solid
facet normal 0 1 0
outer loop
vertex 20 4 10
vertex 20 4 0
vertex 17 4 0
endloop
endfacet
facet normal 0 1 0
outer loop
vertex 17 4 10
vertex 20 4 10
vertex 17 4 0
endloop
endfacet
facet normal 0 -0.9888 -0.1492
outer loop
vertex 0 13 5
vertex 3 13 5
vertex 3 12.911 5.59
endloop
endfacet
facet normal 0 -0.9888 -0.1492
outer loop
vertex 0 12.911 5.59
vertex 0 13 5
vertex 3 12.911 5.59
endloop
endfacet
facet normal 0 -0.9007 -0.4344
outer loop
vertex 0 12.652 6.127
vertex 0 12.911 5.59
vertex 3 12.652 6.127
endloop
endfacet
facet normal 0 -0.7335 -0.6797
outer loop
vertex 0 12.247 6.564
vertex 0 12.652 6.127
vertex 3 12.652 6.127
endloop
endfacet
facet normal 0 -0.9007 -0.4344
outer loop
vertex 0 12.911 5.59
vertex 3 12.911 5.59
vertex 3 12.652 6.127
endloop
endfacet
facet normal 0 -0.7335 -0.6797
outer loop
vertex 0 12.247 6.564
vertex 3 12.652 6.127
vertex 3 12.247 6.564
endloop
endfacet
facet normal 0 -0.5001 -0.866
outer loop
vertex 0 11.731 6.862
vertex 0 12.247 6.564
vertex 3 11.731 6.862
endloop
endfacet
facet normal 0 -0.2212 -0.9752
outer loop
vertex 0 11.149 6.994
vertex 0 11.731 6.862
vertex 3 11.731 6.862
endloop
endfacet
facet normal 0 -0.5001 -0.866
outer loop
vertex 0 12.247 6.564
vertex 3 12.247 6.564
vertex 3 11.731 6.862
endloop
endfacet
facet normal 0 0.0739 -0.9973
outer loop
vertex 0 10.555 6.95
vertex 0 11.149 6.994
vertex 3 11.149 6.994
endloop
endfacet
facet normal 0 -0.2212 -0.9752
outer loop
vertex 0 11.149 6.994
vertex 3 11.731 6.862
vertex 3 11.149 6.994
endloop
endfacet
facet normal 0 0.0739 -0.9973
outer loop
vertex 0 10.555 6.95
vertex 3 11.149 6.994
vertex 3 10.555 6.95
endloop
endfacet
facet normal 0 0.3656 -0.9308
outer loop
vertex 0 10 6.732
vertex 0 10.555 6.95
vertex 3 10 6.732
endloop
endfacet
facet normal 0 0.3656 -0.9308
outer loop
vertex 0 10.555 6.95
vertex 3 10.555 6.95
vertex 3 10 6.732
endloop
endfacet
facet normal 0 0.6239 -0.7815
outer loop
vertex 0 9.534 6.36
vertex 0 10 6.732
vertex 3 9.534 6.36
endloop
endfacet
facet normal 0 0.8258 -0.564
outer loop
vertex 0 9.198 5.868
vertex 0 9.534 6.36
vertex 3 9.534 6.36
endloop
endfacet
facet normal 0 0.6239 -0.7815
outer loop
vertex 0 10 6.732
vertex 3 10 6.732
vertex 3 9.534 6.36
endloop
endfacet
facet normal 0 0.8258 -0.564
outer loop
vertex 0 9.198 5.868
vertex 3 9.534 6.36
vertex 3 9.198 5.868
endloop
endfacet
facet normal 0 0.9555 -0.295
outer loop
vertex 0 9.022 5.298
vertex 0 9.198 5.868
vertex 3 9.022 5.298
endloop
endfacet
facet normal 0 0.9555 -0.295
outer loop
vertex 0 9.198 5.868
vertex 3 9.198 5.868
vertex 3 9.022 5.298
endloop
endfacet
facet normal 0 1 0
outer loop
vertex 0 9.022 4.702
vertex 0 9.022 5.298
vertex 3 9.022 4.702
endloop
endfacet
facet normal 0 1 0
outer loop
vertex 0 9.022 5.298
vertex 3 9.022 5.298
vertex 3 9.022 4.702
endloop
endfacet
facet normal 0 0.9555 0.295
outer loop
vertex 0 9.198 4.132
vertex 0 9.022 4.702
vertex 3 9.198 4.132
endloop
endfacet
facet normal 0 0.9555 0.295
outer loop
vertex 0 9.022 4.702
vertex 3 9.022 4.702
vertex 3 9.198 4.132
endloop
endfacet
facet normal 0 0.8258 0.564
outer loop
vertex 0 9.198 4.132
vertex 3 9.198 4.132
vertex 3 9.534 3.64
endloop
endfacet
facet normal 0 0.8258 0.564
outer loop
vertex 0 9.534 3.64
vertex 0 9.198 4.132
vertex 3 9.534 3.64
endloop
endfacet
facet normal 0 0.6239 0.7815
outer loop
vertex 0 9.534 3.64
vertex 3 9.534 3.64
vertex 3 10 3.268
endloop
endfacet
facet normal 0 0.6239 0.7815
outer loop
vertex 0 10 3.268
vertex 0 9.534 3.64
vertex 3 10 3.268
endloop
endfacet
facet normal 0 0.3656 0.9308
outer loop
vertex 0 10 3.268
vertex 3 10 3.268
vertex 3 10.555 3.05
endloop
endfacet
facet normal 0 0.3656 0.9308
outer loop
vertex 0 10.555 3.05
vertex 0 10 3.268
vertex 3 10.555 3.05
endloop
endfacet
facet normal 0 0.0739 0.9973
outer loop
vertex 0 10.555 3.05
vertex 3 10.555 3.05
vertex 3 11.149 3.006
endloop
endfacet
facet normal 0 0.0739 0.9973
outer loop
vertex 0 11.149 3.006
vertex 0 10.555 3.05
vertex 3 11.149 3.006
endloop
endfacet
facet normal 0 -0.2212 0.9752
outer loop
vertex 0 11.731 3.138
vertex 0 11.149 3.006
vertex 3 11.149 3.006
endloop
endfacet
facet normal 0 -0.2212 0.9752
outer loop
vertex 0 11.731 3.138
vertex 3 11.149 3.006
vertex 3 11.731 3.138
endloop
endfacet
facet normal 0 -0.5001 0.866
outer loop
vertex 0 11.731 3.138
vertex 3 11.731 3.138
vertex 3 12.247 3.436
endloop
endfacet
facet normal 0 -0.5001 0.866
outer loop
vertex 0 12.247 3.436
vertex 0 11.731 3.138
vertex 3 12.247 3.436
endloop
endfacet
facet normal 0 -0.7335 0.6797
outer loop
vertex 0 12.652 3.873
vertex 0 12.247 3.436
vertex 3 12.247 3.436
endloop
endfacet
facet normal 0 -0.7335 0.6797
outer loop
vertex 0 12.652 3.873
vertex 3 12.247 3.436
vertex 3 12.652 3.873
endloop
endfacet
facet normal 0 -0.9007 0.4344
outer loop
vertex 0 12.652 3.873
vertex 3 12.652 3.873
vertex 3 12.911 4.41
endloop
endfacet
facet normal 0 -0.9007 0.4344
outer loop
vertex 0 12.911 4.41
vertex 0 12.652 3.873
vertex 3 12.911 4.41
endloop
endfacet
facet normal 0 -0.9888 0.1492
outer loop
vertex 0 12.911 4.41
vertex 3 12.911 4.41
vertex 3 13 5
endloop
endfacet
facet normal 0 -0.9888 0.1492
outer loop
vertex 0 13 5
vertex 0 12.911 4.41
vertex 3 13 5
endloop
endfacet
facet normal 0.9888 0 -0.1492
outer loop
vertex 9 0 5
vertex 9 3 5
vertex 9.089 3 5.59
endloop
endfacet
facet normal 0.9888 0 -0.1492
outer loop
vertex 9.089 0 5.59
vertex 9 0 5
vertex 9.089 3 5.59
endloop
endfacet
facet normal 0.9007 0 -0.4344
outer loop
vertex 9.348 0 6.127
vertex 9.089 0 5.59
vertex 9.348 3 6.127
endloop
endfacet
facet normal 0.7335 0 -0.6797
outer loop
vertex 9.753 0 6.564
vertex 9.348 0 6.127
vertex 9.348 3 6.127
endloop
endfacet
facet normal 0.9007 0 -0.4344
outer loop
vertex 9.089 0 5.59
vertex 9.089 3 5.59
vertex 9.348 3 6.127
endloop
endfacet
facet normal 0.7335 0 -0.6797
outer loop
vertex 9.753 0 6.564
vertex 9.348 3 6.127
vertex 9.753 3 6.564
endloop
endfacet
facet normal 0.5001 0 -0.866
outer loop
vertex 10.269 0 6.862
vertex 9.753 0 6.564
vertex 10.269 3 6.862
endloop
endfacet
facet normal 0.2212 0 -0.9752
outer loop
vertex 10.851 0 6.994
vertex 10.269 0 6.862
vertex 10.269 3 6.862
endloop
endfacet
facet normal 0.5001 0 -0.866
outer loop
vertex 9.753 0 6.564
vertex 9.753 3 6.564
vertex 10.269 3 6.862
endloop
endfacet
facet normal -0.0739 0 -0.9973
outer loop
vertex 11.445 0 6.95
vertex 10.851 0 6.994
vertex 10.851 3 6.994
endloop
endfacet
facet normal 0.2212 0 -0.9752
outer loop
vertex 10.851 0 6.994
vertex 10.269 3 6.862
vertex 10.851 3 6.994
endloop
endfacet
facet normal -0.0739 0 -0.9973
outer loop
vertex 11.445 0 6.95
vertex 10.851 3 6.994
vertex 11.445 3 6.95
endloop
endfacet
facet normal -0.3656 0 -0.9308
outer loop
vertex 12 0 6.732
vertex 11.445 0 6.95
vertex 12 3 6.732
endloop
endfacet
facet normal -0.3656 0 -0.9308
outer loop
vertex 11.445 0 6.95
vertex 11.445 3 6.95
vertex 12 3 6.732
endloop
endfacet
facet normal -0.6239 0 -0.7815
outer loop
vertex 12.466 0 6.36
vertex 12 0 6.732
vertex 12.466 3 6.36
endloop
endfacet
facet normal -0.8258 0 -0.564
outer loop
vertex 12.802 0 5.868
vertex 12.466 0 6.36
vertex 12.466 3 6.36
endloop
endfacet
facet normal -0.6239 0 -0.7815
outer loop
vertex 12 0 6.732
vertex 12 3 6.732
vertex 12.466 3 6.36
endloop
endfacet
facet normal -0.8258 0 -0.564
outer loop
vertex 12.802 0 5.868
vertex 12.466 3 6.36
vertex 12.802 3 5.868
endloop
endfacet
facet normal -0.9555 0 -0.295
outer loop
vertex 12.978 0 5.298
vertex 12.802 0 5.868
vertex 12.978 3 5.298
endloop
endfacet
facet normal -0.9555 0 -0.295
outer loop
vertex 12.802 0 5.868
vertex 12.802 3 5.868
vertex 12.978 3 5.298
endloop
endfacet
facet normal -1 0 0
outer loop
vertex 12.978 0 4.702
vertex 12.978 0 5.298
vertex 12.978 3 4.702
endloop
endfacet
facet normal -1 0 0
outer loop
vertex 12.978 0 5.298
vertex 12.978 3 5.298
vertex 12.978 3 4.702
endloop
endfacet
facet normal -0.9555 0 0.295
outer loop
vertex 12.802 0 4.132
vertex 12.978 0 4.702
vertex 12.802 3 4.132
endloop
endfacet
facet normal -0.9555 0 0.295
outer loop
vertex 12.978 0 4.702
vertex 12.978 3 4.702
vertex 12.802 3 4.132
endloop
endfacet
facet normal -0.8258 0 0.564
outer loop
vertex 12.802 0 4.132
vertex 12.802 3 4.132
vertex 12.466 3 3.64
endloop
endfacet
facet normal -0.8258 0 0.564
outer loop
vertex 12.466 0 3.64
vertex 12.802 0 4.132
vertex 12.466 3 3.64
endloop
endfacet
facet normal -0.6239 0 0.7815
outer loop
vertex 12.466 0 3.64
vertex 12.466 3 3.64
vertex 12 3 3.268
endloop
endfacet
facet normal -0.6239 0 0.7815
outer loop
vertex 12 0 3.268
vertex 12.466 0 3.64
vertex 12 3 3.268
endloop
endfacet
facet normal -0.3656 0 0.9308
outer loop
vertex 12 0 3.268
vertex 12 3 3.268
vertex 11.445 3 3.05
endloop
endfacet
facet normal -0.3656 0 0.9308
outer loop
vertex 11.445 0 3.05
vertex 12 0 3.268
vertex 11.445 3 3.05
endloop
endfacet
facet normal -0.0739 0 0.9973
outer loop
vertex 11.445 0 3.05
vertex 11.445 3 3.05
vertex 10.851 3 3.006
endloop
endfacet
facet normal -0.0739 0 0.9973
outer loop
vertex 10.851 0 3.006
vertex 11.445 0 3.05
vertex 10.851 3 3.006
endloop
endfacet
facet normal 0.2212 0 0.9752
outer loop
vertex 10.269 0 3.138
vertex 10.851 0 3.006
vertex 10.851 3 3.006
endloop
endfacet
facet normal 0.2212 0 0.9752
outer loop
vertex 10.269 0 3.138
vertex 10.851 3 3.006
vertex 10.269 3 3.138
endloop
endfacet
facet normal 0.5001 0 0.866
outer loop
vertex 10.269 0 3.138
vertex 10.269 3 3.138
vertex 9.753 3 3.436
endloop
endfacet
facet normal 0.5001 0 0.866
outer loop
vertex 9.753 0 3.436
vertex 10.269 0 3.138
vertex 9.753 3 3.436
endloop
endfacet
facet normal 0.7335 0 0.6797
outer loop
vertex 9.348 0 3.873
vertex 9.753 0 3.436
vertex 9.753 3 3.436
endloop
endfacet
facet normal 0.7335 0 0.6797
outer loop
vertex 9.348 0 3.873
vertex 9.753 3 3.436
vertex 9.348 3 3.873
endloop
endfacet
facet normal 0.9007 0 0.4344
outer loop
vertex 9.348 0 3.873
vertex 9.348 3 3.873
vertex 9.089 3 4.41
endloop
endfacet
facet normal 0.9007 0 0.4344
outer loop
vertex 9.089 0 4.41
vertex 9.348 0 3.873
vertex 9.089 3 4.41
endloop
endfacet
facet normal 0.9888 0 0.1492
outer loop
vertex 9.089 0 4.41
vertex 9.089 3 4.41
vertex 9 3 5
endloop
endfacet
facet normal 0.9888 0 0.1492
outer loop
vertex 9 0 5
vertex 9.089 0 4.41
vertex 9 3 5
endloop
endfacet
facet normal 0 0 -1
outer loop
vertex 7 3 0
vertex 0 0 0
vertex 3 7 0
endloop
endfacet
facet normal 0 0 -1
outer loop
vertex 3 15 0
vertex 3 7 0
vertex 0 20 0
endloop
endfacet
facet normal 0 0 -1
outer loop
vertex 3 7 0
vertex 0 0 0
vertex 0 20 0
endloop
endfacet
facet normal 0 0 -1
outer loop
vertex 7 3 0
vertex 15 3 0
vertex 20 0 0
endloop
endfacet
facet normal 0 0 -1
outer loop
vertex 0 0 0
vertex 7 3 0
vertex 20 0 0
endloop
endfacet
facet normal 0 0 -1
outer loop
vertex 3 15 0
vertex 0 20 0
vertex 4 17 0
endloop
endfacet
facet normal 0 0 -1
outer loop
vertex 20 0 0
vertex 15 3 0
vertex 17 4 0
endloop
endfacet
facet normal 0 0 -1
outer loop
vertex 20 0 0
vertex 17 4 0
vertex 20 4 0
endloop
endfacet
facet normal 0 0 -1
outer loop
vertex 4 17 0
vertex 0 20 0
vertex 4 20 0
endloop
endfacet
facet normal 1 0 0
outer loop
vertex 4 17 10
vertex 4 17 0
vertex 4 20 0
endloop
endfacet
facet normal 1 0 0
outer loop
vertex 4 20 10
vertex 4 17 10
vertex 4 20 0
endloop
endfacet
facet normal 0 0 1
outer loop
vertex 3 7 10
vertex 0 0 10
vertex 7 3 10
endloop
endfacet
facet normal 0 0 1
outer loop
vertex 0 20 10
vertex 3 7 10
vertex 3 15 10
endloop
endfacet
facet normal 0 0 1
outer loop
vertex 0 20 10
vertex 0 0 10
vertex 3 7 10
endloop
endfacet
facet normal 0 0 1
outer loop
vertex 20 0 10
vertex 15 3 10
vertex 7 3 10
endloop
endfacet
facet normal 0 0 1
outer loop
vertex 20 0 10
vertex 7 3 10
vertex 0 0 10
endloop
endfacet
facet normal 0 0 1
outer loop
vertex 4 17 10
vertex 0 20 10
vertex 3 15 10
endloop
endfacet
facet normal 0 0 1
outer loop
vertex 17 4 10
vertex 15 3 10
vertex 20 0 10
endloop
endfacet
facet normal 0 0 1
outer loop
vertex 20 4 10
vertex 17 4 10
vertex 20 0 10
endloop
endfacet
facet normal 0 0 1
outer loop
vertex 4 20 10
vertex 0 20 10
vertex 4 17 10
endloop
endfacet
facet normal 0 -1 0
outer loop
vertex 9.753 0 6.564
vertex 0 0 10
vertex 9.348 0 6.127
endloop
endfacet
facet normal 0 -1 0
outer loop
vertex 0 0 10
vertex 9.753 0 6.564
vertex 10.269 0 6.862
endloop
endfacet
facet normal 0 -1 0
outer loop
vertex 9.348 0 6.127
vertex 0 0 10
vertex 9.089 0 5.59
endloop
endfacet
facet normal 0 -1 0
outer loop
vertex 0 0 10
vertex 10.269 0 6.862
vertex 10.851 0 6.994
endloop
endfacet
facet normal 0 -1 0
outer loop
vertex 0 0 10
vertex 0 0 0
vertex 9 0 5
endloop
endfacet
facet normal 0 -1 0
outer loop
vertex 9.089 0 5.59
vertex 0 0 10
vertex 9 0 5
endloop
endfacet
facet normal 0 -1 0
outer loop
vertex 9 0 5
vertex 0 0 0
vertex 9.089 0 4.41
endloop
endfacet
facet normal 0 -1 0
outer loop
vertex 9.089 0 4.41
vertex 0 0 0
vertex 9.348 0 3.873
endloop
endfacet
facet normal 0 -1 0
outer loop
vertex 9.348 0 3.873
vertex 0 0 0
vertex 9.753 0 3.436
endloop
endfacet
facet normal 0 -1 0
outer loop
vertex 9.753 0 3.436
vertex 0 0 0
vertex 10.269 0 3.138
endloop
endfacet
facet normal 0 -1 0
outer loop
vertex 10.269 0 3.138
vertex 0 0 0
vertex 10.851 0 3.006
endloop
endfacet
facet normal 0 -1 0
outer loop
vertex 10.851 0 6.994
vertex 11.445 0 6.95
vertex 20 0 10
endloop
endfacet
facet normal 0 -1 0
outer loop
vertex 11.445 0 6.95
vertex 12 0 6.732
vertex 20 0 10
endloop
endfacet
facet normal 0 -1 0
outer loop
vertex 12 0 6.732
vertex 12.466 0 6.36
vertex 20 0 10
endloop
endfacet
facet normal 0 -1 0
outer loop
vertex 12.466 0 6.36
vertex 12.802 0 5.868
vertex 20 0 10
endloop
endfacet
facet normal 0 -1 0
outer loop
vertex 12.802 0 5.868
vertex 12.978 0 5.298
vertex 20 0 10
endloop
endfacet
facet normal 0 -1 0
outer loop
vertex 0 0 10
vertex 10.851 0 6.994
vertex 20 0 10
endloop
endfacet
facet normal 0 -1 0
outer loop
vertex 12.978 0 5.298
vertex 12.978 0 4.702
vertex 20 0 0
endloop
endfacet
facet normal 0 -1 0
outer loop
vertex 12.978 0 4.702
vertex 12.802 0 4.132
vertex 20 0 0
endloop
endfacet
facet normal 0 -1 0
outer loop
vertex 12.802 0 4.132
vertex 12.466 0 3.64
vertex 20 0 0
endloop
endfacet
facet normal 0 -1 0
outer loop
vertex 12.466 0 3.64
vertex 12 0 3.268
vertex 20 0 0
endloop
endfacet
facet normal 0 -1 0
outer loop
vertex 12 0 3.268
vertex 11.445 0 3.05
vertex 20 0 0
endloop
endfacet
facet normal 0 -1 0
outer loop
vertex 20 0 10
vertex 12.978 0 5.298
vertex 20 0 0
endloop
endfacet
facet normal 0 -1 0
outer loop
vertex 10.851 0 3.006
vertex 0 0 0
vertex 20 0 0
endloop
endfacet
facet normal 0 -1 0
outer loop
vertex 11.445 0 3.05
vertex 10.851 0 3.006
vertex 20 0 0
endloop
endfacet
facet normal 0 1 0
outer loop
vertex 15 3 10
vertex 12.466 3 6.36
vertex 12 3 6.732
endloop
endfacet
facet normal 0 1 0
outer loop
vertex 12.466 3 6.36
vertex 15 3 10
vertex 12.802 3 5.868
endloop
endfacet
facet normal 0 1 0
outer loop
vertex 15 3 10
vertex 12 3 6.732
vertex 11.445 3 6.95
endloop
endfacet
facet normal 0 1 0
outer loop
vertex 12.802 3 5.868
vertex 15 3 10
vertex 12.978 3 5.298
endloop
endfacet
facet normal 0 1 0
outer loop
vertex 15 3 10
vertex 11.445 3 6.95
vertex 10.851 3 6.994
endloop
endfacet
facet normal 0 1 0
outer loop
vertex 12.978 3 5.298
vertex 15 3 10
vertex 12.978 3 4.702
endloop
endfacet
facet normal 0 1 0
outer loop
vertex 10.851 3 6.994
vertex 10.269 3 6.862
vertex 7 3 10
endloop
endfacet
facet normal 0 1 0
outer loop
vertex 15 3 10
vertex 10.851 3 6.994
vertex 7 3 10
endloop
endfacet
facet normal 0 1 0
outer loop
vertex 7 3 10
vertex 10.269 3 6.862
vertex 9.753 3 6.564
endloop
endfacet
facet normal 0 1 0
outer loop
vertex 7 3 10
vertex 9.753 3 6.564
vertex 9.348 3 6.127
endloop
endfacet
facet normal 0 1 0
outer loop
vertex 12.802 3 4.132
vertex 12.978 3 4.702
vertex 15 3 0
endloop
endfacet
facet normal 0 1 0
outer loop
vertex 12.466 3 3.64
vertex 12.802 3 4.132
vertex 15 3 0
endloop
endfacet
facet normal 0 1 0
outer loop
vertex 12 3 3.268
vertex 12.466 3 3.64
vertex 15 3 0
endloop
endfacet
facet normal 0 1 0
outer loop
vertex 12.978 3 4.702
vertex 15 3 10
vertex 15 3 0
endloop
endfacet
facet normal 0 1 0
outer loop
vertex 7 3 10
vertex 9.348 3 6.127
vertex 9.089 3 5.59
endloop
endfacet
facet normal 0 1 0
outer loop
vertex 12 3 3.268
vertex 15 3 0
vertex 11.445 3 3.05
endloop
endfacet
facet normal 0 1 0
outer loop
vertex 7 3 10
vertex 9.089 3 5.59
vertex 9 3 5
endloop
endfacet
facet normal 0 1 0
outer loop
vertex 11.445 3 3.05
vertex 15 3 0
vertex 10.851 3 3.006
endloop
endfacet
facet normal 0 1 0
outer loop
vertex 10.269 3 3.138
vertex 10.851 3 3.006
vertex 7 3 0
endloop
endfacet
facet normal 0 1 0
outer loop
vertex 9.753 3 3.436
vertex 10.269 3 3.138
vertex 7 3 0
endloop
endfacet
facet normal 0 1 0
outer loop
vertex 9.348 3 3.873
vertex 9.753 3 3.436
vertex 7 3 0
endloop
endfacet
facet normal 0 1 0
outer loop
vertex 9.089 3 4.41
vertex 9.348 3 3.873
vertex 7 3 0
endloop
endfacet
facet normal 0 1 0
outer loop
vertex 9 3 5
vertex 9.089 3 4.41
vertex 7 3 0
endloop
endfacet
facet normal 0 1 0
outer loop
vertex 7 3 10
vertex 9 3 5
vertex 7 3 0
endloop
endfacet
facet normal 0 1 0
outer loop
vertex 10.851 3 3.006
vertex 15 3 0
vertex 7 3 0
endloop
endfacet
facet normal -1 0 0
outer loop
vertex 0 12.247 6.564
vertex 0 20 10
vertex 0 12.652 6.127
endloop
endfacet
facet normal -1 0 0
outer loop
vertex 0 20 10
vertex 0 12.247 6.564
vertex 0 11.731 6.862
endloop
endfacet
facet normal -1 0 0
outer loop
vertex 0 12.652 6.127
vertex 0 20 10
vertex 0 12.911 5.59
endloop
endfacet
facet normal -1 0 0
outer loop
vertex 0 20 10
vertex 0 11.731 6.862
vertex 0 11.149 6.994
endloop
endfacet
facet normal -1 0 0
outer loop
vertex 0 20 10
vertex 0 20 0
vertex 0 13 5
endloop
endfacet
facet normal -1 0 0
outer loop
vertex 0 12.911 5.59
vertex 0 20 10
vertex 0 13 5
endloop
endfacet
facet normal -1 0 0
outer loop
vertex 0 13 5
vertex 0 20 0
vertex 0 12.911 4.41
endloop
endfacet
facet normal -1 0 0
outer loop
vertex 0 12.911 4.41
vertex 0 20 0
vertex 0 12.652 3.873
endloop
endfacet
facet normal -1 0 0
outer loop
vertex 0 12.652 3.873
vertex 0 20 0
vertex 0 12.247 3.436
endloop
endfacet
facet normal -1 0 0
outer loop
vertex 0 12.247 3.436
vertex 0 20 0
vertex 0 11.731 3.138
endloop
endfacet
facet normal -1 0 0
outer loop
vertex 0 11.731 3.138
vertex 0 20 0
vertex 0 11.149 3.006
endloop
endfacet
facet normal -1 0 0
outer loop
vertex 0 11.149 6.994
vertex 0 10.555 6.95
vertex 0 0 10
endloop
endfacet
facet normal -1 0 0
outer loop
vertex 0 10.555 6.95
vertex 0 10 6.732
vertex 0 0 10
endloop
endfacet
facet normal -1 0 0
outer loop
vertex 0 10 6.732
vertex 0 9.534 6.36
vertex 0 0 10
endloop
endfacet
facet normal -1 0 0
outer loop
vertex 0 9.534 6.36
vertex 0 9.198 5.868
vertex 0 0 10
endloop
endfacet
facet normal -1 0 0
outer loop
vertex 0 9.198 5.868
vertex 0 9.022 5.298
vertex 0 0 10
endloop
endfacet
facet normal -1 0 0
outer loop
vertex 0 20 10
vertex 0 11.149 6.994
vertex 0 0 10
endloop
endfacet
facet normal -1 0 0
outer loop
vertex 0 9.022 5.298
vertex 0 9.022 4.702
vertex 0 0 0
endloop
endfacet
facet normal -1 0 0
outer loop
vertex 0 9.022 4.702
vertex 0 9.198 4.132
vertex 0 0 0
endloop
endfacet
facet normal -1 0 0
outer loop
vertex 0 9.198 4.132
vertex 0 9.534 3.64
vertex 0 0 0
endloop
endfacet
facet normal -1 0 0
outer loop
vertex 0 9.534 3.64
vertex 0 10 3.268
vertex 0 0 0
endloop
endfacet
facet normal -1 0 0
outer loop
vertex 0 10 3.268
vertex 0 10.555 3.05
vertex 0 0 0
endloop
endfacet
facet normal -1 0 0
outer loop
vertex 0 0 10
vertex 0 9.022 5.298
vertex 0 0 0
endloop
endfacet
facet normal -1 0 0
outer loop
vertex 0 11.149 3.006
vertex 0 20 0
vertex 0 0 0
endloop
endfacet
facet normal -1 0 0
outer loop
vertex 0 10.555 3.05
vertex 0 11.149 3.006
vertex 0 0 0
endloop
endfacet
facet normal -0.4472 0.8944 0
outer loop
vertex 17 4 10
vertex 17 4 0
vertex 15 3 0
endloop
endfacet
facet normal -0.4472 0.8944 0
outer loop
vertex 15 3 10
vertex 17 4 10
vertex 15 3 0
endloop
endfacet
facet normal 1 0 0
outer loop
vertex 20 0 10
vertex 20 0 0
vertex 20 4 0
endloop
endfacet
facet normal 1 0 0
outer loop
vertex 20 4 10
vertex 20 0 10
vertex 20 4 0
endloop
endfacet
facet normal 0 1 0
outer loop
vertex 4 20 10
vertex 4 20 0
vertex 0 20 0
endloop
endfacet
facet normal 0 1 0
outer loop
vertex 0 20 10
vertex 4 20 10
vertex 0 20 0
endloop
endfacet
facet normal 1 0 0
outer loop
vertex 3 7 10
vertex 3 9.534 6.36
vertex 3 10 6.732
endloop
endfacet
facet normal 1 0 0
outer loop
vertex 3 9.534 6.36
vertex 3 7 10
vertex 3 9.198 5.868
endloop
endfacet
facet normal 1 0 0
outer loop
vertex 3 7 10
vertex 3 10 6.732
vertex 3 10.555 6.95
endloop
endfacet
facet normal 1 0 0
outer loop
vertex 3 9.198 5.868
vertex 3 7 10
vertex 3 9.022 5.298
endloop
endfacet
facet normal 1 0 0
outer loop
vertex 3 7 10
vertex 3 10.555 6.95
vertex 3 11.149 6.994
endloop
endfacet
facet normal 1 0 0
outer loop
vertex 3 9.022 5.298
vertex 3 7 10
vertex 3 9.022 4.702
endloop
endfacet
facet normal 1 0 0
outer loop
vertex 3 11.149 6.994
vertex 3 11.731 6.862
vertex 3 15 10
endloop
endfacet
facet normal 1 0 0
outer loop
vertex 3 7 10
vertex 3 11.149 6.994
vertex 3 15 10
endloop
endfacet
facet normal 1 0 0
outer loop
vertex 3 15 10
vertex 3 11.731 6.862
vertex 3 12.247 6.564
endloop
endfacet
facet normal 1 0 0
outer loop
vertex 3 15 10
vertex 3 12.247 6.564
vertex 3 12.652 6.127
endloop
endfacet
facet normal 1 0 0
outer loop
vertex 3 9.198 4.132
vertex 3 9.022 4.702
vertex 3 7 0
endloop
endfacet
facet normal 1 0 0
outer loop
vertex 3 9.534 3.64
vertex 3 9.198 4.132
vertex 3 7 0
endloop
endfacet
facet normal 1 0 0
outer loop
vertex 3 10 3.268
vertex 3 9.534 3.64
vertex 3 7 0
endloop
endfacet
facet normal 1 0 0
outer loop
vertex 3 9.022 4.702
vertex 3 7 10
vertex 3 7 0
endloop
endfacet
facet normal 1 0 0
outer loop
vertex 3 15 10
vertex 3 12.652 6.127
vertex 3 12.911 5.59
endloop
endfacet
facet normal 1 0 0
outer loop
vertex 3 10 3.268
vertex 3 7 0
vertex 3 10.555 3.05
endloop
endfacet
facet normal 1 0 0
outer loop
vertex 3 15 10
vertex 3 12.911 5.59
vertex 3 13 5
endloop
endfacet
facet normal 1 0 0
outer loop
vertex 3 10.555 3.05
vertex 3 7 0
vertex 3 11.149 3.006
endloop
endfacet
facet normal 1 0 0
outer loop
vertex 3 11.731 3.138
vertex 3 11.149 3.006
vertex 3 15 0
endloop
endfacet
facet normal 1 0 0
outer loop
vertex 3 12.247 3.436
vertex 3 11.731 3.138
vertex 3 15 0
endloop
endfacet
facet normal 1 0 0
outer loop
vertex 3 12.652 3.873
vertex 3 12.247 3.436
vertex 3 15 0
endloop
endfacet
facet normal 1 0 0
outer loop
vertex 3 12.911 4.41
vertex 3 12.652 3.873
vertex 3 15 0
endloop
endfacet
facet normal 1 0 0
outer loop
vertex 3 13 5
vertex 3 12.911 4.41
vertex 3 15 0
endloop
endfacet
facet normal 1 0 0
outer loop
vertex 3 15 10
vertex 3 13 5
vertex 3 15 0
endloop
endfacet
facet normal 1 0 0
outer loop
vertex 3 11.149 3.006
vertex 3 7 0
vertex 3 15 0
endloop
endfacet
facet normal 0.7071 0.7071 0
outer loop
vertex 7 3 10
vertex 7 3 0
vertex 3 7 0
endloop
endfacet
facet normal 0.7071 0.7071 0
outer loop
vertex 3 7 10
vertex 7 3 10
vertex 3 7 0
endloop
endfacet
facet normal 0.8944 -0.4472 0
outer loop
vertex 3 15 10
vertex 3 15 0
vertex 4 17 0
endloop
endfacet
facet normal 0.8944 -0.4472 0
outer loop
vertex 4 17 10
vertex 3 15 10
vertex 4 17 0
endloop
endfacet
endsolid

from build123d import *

# Parameters (mm, degrees)
F1_DEPTH = 10
F2_R     = 2
F3_DEPTH = 5
F4_R     = 2
F5_DEPTH = 5


with BuildPart() as f1:
    # F0 (on Top) → F1 (new body)
    with BuildSketch(Plane.XY):
        Polygon((0, 20), (0, 0), (20, 0), (20, 4), (17, 4), (15, 3), (7, 3), (5, 5), (3, 7), (3, 15), (4, 17), (4, 20), align=None)
    extrude(amount=F1_DEPTH)

    # F2 (on face) → F3 (cut)
    with BuildSketch(Plane.YZ.offset(3)):
        with Locations((11, 5)):
            Circle(F2_R)
    extrude(amount=-F3_DEPTH, mode=Mode.SUBTRACT)

    # F4 (on face) → F5 (cut)
    with BuildSketch(Plane(origin=(0, 3, 0), x_dir=(-1, 0, 0), z_dir=(0, 1, 0))):
        with Locations((-11, 5)):
            Circle(F4_R)
    extrude(amount=-F5_DEPTH, mode=Mode.SUBTRACT)


solid = f1.part
